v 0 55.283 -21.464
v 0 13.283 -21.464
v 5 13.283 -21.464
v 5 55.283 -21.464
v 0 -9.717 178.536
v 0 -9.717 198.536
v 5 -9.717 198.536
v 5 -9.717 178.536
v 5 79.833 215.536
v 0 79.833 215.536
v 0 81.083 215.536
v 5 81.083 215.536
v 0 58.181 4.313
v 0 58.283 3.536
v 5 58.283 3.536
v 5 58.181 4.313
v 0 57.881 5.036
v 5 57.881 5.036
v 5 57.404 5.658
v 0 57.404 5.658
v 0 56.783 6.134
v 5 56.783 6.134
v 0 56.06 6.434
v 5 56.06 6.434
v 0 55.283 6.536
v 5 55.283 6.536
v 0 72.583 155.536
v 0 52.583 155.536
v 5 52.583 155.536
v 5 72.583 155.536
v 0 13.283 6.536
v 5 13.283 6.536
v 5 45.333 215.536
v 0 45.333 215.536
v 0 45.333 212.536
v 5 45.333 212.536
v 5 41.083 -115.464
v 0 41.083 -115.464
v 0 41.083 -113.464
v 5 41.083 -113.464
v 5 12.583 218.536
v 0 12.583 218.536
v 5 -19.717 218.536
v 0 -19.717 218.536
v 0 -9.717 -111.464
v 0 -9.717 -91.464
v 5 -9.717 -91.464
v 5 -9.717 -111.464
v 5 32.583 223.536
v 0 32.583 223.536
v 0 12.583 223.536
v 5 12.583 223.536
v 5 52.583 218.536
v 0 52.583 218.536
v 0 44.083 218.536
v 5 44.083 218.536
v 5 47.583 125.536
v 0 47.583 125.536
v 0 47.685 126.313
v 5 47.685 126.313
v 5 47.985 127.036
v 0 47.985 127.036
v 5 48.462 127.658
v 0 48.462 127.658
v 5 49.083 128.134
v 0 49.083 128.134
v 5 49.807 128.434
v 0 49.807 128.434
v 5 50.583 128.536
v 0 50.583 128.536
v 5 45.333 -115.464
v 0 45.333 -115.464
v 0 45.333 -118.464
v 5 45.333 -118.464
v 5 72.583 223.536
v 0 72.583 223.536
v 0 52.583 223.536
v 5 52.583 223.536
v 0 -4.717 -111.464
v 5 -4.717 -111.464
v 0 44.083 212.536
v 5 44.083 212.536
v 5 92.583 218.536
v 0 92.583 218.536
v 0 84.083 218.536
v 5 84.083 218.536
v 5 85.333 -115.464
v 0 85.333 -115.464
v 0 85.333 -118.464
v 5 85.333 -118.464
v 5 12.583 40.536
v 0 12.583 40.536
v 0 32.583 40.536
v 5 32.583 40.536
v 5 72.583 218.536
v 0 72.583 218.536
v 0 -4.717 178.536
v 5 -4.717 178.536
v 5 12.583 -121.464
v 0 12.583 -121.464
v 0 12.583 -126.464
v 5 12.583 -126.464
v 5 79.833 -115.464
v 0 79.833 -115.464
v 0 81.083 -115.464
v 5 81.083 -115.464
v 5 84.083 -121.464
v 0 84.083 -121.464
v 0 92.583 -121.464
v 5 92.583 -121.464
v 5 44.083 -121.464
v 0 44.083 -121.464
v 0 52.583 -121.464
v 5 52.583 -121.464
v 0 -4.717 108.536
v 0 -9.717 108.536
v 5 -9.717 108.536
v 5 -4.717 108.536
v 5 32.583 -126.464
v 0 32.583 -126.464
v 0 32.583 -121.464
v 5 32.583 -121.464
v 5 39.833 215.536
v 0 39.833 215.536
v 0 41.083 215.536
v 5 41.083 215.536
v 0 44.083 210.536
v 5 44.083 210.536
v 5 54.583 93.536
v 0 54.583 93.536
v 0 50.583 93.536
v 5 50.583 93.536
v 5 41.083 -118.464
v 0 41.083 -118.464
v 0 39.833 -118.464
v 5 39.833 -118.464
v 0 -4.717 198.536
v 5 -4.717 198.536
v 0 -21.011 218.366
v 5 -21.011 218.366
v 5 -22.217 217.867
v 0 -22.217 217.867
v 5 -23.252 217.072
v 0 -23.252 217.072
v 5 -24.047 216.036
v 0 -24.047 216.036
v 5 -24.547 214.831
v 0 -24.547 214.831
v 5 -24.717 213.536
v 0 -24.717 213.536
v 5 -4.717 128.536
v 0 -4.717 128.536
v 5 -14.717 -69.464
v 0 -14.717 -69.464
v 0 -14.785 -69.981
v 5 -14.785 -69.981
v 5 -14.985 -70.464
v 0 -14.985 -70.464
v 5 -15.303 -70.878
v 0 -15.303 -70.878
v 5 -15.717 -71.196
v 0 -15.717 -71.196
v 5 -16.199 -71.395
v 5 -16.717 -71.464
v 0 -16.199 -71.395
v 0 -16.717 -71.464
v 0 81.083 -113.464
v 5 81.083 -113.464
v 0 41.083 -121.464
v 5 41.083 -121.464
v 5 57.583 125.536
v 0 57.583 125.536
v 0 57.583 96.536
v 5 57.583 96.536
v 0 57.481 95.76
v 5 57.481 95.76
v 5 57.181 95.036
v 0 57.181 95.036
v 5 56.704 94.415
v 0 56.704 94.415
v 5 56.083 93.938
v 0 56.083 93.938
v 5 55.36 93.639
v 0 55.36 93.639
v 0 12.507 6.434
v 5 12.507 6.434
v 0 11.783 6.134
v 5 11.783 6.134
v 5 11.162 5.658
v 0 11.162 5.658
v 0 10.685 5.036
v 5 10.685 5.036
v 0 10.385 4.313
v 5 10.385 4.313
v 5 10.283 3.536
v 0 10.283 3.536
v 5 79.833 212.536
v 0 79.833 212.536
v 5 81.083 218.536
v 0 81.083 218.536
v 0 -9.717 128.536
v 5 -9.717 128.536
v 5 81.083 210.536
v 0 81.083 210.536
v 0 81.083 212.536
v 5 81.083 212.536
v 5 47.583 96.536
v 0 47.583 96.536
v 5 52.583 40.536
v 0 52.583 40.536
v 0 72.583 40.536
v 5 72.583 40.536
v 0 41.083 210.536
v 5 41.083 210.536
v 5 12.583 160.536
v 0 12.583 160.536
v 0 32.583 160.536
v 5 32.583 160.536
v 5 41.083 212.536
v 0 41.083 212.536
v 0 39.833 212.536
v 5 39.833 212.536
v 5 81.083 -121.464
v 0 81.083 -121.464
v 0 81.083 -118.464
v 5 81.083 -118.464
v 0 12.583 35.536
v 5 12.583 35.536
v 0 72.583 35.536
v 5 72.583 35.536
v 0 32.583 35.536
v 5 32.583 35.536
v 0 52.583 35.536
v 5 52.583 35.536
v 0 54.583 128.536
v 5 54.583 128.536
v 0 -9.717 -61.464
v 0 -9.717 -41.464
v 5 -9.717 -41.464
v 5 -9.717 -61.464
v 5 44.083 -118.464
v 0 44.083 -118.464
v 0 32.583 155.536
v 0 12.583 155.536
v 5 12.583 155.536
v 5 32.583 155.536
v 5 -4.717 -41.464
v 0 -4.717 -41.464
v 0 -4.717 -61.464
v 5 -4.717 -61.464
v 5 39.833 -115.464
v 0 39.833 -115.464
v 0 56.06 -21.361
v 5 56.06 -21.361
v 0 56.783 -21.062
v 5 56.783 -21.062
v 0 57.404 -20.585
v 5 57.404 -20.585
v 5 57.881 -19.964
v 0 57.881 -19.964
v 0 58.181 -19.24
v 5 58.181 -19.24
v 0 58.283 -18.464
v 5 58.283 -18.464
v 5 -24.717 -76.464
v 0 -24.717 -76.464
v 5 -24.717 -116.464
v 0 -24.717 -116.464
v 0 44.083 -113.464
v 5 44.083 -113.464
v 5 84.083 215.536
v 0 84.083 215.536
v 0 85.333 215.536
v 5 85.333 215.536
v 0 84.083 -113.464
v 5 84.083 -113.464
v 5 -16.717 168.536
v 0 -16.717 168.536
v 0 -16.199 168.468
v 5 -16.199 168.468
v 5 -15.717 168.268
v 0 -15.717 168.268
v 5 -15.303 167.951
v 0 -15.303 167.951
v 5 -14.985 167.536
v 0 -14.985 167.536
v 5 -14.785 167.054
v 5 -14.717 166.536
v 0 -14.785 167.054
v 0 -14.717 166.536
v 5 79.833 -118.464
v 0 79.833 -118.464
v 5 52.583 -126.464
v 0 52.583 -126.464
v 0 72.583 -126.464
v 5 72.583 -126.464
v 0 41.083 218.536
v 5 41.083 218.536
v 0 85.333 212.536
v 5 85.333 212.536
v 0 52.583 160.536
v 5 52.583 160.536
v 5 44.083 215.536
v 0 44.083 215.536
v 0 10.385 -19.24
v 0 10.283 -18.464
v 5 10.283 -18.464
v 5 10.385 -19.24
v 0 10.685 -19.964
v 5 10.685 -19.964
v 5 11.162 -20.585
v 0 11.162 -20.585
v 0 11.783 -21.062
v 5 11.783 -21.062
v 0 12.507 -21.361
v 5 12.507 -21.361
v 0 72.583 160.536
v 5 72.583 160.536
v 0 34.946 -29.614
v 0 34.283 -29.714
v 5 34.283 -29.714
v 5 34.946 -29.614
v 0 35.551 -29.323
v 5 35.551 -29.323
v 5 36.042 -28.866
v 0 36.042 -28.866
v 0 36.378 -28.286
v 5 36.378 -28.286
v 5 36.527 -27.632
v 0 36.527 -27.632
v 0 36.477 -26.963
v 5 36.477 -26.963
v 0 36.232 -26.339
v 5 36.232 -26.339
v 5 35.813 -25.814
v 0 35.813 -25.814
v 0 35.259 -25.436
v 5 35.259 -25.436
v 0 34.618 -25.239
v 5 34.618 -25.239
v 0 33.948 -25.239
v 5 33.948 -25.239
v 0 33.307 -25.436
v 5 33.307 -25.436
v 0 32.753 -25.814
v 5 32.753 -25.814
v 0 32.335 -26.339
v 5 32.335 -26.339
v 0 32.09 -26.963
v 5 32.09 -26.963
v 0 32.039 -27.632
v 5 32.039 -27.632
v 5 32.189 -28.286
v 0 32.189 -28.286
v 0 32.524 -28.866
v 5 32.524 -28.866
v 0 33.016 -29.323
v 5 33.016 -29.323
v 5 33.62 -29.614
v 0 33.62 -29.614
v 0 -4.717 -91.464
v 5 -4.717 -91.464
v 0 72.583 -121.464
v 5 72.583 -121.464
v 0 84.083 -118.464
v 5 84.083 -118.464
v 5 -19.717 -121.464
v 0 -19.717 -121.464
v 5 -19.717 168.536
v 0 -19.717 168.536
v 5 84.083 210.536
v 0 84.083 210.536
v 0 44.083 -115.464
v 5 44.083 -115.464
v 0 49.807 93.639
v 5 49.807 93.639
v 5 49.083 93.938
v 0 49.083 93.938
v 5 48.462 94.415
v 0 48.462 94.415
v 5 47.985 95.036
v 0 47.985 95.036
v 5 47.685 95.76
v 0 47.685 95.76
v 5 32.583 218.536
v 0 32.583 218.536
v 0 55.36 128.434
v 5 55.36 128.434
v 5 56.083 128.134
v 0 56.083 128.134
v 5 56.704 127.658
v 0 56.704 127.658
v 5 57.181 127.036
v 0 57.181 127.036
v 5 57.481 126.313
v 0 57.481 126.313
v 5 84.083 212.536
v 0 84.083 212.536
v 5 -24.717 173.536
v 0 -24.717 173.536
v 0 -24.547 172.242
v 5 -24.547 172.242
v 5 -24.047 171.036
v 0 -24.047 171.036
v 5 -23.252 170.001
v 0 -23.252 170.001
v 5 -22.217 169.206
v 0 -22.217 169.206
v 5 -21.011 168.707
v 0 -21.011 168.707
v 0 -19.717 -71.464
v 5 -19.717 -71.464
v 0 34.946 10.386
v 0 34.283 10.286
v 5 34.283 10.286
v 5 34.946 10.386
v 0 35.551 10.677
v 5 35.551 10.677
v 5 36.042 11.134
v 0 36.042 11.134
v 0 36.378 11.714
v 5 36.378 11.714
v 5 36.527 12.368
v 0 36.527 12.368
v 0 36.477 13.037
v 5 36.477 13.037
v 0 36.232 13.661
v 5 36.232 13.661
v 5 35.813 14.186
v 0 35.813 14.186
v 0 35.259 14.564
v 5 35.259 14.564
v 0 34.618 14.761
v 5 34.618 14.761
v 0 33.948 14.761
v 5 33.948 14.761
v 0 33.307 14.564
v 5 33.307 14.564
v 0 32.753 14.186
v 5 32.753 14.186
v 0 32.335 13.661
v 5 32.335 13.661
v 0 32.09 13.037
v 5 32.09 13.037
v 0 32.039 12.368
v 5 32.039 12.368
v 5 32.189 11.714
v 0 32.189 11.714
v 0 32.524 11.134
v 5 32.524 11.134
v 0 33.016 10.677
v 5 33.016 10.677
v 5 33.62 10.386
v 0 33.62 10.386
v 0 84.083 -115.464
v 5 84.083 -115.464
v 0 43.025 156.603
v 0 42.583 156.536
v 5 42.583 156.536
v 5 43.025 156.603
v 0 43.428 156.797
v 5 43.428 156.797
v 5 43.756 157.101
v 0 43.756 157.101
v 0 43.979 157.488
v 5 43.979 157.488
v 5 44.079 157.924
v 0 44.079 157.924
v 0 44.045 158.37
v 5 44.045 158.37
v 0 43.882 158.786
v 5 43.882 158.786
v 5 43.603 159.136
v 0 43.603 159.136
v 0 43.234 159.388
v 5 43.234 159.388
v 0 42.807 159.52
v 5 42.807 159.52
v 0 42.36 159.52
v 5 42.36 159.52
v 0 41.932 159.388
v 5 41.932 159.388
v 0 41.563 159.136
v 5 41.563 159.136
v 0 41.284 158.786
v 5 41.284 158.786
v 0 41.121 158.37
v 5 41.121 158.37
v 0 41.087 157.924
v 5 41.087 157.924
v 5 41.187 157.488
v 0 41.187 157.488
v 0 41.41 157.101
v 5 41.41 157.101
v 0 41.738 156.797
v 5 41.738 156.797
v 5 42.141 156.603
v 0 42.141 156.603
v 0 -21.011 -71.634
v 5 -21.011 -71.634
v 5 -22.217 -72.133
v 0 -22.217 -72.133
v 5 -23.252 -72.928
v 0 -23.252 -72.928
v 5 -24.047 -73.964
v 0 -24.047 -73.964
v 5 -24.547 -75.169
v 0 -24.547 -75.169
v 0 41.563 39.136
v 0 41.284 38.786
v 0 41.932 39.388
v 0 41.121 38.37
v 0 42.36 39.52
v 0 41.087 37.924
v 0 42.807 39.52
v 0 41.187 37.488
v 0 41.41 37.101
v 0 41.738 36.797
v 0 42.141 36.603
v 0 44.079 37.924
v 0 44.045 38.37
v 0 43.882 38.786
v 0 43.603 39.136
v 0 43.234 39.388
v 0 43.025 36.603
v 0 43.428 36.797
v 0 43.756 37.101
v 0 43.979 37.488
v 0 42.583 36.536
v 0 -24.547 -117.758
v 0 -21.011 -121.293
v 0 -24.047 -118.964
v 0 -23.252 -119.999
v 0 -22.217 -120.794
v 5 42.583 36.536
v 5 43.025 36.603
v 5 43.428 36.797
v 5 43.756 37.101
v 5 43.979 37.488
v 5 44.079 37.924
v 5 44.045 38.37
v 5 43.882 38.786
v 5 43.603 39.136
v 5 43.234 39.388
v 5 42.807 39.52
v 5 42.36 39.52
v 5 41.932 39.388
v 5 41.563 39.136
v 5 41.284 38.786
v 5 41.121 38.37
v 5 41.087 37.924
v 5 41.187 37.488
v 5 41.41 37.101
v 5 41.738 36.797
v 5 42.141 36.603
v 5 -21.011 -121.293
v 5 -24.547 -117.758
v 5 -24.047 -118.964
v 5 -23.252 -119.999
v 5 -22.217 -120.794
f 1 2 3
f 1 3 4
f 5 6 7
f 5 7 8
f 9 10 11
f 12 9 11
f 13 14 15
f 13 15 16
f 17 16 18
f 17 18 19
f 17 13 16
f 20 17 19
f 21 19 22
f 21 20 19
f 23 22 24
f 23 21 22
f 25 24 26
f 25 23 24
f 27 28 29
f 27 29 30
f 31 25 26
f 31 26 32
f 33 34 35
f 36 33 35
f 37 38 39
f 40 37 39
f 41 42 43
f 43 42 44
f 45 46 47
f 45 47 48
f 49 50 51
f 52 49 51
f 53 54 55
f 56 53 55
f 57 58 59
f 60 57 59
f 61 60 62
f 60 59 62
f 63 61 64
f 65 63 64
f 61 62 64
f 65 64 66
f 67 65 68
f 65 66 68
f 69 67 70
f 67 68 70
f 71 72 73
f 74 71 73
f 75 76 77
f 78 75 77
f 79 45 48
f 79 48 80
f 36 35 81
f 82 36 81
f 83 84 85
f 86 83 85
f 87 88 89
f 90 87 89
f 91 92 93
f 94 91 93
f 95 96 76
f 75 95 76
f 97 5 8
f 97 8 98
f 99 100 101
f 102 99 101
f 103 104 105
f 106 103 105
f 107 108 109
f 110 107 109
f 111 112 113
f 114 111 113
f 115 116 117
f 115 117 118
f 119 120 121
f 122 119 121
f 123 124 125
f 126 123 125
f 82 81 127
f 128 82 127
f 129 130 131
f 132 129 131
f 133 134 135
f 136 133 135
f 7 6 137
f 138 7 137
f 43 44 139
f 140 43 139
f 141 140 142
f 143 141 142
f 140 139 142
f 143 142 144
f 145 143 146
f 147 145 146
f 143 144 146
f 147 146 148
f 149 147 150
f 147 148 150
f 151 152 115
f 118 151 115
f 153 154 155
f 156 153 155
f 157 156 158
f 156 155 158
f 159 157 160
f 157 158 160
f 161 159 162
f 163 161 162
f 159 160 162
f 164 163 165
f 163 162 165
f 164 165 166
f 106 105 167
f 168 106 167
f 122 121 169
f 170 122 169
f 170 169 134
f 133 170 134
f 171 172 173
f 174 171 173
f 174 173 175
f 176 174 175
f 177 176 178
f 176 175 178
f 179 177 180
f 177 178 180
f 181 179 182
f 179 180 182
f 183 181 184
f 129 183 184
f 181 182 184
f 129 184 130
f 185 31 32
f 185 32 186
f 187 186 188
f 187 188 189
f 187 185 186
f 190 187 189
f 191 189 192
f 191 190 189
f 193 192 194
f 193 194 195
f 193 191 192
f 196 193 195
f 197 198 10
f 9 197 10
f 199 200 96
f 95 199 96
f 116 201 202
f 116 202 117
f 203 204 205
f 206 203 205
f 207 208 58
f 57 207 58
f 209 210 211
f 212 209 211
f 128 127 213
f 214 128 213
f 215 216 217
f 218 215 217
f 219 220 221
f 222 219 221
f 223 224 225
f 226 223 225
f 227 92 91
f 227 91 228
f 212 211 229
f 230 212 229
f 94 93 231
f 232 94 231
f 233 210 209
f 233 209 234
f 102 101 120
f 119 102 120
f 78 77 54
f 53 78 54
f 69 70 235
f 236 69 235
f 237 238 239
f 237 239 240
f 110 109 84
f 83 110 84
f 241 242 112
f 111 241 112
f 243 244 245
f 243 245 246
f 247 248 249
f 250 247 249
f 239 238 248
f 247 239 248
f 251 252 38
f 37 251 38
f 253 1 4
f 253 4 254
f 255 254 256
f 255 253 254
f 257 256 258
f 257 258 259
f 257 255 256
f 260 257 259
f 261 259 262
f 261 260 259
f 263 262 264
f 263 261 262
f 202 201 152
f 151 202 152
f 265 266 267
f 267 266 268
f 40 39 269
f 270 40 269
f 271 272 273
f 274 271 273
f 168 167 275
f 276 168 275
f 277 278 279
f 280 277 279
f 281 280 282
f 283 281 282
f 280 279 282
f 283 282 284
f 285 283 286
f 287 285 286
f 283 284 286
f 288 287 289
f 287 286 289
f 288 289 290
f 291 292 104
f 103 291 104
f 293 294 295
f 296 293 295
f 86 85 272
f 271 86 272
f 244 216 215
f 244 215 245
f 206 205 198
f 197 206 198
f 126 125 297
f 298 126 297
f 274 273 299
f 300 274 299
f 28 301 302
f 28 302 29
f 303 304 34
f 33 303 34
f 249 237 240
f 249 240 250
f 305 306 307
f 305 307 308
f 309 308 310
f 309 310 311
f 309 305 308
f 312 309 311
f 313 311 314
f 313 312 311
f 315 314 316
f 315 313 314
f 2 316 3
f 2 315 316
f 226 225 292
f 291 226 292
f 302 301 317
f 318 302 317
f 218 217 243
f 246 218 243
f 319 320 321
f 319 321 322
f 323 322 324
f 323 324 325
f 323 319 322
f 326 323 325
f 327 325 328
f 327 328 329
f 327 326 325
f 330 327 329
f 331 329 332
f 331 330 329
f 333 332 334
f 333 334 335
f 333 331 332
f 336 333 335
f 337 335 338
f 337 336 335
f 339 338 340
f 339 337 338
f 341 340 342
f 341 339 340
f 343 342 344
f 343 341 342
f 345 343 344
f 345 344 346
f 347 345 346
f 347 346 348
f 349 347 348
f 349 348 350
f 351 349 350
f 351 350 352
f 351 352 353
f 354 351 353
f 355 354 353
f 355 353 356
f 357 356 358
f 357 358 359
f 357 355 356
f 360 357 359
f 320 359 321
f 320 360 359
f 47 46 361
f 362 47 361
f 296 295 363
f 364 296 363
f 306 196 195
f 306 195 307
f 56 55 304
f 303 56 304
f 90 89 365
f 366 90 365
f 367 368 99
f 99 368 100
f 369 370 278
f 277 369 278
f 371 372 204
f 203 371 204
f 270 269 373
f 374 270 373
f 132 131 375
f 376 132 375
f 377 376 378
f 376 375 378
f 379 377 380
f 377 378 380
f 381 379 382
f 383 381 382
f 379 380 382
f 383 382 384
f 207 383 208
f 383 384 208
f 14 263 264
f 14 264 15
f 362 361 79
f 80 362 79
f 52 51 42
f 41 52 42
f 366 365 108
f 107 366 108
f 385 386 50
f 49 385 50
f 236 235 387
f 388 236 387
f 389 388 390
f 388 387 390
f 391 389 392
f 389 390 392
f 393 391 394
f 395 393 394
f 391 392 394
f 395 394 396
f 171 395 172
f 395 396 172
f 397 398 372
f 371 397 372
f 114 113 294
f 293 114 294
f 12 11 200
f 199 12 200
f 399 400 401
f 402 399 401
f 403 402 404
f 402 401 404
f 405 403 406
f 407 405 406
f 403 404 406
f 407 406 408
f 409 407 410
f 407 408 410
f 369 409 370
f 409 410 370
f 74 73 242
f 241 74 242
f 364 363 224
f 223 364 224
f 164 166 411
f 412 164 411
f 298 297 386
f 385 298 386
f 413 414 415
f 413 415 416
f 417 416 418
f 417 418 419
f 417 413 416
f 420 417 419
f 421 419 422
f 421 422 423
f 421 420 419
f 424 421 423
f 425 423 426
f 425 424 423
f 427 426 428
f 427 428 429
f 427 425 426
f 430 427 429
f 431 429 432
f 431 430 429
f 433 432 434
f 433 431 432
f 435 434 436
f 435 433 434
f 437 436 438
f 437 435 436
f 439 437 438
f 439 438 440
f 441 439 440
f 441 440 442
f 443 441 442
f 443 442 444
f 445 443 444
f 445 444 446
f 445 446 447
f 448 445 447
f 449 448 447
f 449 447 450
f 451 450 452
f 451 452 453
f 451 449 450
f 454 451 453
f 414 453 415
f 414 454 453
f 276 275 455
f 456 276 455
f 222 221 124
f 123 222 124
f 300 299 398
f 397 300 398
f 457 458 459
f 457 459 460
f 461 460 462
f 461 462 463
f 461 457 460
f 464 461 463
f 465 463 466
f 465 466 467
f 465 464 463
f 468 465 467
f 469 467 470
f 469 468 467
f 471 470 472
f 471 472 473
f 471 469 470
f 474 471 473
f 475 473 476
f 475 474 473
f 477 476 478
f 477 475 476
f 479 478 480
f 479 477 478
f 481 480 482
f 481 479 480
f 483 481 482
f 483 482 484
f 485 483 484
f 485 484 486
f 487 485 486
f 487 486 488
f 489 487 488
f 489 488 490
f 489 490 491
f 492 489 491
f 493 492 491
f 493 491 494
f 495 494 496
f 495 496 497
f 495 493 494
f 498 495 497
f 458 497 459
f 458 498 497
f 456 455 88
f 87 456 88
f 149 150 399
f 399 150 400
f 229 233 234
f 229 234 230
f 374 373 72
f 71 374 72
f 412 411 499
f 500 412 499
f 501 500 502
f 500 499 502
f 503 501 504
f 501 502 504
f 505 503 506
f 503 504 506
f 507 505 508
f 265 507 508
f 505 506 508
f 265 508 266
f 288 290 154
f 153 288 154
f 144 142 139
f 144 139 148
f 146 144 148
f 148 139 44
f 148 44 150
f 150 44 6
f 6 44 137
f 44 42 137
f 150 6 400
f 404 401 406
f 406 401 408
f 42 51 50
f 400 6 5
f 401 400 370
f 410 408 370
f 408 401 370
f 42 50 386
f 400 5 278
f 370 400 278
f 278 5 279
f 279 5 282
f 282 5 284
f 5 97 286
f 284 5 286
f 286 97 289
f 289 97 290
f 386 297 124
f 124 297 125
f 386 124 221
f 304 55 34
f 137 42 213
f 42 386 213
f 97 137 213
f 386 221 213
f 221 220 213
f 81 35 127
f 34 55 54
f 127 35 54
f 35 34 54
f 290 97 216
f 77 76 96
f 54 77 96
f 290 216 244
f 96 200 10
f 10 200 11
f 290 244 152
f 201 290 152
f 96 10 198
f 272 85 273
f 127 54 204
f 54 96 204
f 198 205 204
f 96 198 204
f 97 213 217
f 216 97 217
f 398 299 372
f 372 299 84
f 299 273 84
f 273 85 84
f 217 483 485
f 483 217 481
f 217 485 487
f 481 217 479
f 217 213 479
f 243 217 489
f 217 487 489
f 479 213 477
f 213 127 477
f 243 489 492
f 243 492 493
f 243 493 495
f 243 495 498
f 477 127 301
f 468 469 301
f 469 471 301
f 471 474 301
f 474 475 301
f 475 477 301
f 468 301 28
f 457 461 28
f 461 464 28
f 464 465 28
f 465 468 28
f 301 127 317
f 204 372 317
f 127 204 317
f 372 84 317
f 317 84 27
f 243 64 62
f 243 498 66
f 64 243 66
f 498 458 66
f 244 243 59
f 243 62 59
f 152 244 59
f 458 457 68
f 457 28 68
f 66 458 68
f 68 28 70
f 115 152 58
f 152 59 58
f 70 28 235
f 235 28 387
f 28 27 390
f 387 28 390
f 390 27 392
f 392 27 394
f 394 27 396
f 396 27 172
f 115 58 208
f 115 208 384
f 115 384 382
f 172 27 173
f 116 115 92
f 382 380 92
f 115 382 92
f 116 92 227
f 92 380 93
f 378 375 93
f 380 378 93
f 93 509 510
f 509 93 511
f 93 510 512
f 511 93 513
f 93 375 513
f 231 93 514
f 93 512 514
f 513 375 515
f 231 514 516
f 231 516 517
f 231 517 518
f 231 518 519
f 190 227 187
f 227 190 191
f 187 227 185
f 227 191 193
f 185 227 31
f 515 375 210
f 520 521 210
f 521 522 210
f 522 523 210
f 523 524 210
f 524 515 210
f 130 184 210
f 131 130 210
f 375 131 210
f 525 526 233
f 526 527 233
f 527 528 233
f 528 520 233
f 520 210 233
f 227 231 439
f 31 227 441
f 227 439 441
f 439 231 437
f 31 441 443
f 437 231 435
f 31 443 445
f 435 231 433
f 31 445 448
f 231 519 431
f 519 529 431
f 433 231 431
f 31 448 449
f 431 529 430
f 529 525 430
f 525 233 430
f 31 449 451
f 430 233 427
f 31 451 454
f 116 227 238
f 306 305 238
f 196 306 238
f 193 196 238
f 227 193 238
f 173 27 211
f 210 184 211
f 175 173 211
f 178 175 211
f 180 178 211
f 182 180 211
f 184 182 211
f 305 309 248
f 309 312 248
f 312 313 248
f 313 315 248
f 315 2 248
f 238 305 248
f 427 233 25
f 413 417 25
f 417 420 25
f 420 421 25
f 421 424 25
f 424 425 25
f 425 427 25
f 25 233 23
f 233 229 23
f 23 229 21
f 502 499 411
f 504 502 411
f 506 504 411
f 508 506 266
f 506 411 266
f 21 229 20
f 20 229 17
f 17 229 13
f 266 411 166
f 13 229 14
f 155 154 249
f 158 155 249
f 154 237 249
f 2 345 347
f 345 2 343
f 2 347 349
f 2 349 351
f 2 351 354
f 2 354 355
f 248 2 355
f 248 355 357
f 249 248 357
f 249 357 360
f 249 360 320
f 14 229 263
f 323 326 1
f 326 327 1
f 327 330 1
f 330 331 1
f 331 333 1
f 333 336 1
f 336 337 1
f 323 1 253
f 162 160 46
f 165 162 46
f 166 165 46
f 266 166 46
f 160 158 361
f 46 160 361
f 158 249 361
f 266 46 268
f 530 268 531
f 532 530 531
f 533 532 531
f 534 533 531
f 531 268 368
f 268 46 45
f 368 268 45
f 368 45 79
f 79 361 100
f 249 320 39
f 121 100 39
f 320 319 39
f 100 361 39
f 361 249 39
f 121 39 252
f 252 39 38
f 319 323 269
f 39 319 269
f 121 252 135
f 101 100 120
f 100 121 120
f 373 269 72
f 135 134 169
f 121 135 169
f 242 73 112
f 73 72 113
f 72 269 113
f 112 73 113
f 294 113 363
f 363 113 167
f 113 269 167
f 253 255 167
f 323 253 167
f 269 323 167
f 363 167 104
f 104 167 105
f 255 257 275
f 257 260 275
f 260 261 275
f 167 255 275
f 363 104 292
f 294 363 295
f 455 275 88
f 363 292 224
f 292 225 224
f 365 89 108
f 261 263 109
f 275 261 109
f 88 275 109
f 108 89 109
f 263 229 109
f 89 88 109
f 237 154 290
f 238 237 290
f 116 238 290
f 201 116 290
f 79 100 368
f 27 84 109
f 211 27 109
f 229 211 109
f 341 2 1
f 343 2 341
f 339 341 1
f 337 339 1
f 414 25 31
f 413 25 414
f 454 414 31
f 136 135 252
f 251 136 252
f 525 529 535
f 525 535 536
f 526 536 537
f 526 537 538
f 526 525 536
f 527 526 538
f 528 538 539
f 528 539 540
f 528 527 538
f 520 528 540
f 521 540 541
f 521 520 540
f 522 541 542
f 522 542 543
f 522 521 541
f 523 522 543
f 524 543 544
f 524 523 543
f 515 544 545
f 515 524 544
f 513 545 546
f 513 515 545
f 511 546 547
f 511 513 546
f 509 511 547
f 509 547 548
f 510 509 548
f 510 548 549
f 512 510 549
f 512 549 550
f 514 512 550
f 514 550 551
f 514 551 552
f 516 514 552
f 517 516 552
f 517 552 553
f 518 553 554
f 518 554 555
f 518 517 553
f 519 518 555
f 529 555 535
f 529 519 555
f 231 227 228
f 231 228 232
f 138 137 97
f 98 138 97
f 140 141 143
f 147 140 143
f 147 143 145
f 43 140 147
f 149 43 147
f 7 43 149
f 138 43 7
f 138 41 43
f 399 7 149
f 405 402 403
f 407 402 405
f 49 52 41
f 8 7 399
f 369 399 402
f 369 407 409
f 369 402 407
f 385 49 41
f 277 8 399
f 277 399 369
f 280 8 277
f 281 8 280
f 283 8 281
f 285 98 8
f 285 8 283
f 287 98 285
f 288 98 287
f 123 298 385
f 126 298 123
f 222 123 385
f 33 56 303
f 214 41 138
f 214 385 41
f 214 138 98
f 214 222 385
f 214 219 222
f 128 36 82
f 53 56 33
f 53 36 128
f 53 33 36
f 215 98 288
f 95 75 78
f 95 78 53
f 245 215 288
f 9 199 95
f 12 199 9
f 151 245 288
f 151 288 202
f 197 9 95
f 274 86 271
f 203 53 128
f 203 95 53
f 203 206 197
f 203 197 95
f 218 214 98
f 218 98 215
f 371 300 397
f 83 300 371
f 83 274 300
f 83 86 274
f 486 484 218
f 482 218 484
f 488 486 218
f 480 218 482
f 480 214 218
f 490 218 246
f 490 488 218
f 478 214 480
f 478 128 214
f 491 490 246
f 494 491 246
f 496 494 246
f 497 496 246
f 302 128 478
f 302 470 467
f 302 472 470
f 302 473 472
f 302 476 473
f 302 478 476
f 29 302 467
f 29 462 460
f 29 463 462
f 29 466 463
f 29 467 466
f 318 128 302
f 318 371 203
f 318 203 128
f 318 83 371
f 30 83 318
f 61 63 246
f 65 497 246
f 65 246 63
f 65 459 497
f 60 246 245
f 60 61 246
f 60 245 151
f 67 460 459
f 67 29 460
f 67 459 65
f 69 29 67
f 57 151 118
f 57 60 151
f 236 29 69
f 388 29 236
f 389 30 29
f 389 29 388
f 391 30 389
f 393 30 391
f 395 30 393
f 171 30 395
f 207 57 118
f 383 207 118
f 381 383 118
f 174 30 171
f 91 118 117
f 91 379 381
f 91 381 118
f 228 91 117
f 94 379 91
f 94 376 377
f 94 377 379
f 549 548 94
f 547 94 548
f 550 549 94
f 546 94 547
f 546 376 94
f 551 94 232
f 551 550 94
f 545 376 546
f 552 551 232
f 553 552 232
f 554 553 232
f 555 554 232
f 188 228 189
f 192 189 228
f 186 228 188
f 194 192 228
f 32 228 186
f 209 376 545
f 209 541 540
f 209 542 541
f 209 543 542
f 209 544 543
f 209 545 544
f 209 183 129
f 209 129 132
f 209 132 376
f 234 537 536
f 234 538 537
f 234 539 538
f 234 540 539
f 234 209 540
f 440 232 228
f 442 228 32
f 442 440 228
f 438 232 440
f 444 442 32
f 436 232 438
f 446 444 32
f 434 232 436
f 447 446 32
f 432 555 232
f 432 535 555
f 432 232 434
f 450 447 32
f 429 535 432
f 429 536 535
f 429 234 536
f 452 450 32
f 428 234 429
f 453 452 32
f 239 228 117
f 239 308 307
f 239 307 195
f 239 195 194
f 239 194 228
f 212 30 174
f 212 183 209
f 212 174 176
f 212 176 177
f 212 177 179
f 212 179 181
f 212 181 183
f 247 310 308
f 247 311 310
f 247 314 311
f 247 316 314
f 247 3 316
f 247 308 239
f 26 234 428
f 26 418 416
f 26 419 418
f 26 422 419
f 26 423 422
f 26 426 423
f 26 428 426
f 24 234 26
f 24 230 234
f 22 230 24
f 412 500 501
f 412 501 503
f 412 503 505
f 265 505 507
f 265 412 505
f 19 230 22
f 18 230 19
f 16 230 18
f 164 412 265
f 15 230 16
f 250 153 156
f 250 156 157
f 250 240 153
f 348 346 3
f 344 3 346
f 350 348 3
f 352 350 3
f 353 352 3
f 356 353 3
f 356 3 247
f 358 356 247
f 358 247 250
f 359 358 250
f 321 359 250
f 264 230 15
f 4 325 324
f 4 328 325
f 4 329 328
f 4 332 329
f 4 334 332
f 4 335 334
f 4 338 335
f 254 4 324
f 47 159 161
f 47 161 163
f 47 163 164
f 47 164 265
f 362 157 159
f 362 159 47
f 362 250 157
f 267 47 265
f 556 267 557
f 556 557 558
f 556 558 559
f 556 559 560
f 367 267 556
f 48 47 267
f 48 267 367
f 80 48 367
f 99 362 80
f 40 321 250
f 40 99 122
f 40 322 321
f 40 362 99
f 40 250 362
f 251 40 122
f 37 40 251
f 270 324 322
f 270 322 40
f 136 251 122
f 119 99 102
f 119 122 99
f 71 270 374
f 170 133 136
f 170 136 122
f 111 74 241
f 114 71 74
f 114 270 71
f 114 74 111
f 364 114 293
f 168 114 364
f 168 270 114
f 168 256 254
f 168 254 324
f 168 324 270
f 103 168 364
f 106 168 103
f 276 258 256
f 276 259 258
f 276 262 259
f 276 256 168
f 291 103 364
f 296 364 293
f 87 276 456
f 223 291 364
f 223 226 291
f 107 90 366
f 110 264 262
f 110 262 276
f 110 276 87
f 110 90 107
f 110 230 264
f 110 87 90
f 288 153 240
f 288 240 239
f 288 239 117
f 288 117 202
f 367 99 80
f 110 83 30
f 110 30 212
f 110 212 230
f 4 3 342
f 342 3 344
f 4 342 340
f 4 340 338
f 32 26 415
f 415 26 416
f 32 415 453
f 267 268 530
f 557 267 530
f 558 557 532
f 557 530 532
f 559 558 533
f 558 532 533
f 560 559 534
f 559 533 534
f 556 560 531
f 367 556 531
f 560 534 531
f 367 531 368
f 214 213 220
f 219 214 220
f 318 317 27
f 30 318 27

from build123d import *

# Parameters (mm, degrees)
SKETCH_1_R      = 2.25
SKETCH_1_R_2    = 1.5
SKETCH_1_W      = 5
SKETCH_1_H      = 20
SKETCH_1_W_2    = 20
SKETCH_1_H_2    = 5
EXTRUDE_1_DEPTH = 5


with BuildPart() as part:
    # 草图1 → 凸台-拉伸1 (new body)
    with BuildSketch(Plane(origin=(0, 0, 0), x_dir=(0, 0, -1), z_dir=(1, 0, 0))):
        with BuildLine():
            Line((-168.536416178, -19.716908756), (-168.536416178, -16.716908756))
            ThreePointArc((-168.536416178, -16.716908756), (-167.950629741, -15.302695194), (-166.536416178, -14.716908756))
            Line((-166.536416178, -14.716908756), (69.463583822, -14.716908756))
            ThreePointArc((69.463583822, -14.716908756), (70.877797384, -15.302695194), (71.463583822, -16.716908756))
            Line((71.463583822, -16.716908756), (71.463583822, -19.716908756))
            ThreePointArc((71.463583822, -19.716908756), (72.928049916, -23.252442662), (76.463583822, -24.716908756))
            Line((76.463583822, -24.716908756), (116.463583822, -24.716908756))
            ThreePointArc((116.463583822, -24.716908756), (119.999117728, -23.252442662), (121.463583822, -19.716908756))
            Line((121.463583822, -19.716908756), (121.463583822, 12.583091244))
            Line((121.463583822, 12.583091244), (126.463583822, 12.583091244))
            Line((126.463583822, 12.583091244), (126.463583822, 32.583091244))
            Line((126.463583822, 32.583091244), (121.463583822, 32.583091244))
            Line((121.463583822, 32.583091244), (121.463583822, 41.083091244))
            Line((121.463583822, 41.083091244), (118.463583822, 41.083091244))
            Line((118.463583822, 41.083091244), (118.463583822, 39.833091244))
            Line((118.463583822, 39.833091244), (115.463583822, 39.833091244))
            Line((115.463583822, 39.833091244), (115.463583822, 41.083091244))
            Line((115.463583822, 41.083091244), (113.463583822, 41.083091244))
            Line((113.463583822, 41.083091244), (113.463583822, 44.083091244))
            Line((113.463583822, 44.083091244), (115.463583822, 44.083091244))
            Line((115.463583822, 44.083091244), (115.463583822, 45.333091244))
            Line((115.463583822, 45.333091244), (118.463583822, 45.333091244))
            Line((118.463583822, 45.333091244), (118.463583822, 44.083091244))
            Line((118.463583822, 44.083091244), (121.463583822, 44.083091244))
            Line((121.463583822, 44.083091244), (121.463583822, 52.583091244))
            Line((121.463583822, 52.583091244), (126.463583822, 52.583091244))
            Line((126.463583822, 52.583091244), (126.463583822, 72.583091244))
            Line((126.463583822, 72.583091244), (121.463583822, 72.583091244))
            Line((121.463583822, 72.583091244), (121.463583822, 81.083091244))
            Line((121.463583822, 81.083091244), (118.463583822, 81.083091244))
            Line((118.463583822, 81.083091244), (118.463583822, 79.833091244))
            Line((118.463583822, 79.833091244), (115.463583822, 79.833091244))
            Line((115.463583822, 79.833091244), (115.463583822, 81.083091244))
            Line((115.463583822, 81.083091244), (113.463583822, 81.083091244))
            Line((113.463583822, 81.083091244), (113.463583822, 84.083091244))
            Line((113.463583822, 84.083091244), (115.463583822, 84.083091244))
            Line((115.463583822, 84.083091244), (115.463583822, 85.333091244))
            Line((115.463583822, 85.333091244), (118.463583822, 85.333091244))
            Line((118.463583822, 85.333091244), (118.463583822, 84.083091244))
            Line((118.463583822, 84.083091244), (121.463583822, 84.083091244))
            Line((121.463583822, 84.083091244), (121.463583822, 92.583091244))
            Line((121.463583822, 92.583091244), (-218.536416178, 92.583091244))
            Line((-218.536416178, 92.583091244), (-218.536416178, 84.083091244))
            Line((-218.536416178, 84.083091244), (-215.536416178, 84.083091244))
            Line((-215.536416178, 84.083091244), (-215.536416178, 85.333091244))
            Line((-215.536416178, 85.333091244), (-212.536416178, 85.333091244))
            Line((-212.536416178, 85.333091244), (-212.536416178, 84.083091244))
            Line((-212.536416178, 84.083091244), (-210.536416178, 84.083091244))
            Line((-210.536416178, 84.083091244), (-210.536416178, 81.083091244))
            Line((-210.536416178, 81.083091244), (-212.536416178, 81.083091244))
            Line((-212.536416178, 81.083091244), (-212.536416178, 79.833091244))
            Line((-212.536416178, 79.833091244), (-215.536416178, 79.833091244))
            Line((-215.536416178, 79.833091244), (-215.536416178, 81.083091244))
            Line((-215.536416178, 81.083091244), (-218.536416178, 81.083091244))
            Line((-218.536416178, 81.083091244), (-218.536416178, 72.583091244))
            Line((-218.536416178, 72.583091244), (-223.536416178, 72.583091244))
            Line((-223.536416178, 72.583091244), (-223.536416178, 52.583091244))
            Line((-223.536416178, 52.583091244), (-218.536416178, 52.583091244))
            Line((-218.536416178, 52.583091244), (-218.536416178, 44.083091244))
            Line((-218.536416178, 44.083091244), (-215.536416178, 44.083091244))
            Line((-215.536416178, 44.083091244), (-215.536416178, 45.333091244))
            Line((-215.536416178, 45.333091244), (-212.536416178, 45.333091244))
            Line((-212.536416178, 45.333091244), (-212.536416178, 44.083091244))
            Line((-212.536416178, 44.083091244), (-210.536416178, 44.083091244))
            Line((-210.536416178, 44.083091244), (-210.536416178, 41.083091244))
            Line((-210.536416178, 41.083091244), (-212.536416178, 41.083091244))
            Line((-212.536416178, 41.083091244), (-212.536416178, 39.833091244))
            Line((-212.536416178, 39.833091244), (-215.536416178, 39.833091244))
            Line((-215.536416178, 39.833091244), (-215.536416178, 41.083091244))
            Line((-215.536416178, 41.083091244), (-218.536416178, 41.083091244))
            Line((-218.536416178, 41.083091244), (-218.536416178, 32.583091244))
            Line((-218.536416178, 32.583091244), (-223.536416178, 32.583091244))
            Line((-223.536416178, 32.583091244), (-223.536416178, 12.583091244))
            Line((-223.536416178, 12.583091244), (-218.536416178, 12.583091244))
            Line((-218.536416178, 12.583091244), (-218.536416178, -19.716908756))
            ThreePointArc((-218.536416178, -19.716908756), (-217.071950084, -23.252442662), (-213.536416178, -24.716908756))
            Line((-213.536416178, -24.716908756), (-173.536416178, -24.716908756))
            ThreePointArc((-173.536416178, -24.716908756), (-170.000882272, -23.252442662), (-168.536416178, -19.716908756))
        make_face()
        with Locations((27.463583822, 34.283091244)):
            Circle(SKETCH_1_R, mode=Mode.SUBTRACT)
        with Locations((-12.536416178, 34.283091244)):
            Circle(SKETCH_1_R, mode=Mode.SUBTRACT)
        with Locations((-38.036416178, 42.583091244)):
            Circle(SKETCH_1_R_2, mode=Mode.SUBTRACT)
        with Locations((-158.036416178, 42.583091244)):
            Circle(SKETCH_1_R_2, mode=Mode.SUBTRACT)
        with Locations((-38.036416178, 62.583091244)):
            Rectangle(SKETCH_1_W, SKETCH_1_H, mode=Mode.SUBTRACT)
        with Locations((-38.036416178, 22.583091244)):
            Rectangle(SKETCH_1_W, SKETCH_1_H, mode=Mode.SUBTRACT)
        with Locations((-158.036416178, 62.583091244)):
            Rectangle(SKETCH_1_W, SKETCH_1_H, mode=Mode.SUBTRACT)
        with Locations((-158.036416178, 22.583091244)):
            Rectangle(SKETCH_1_W, SKETCH_1_H, mode=Mode.SUBTRACT)
        with Locations((-118.536416178, -7.216908756)):
            Rectangle(SKETCH_1_W_2, SKETCH_1_H_2, mode=Mode.SUBTRACT)
        with Locations((-188.536416178, -7.216908756)):
            Rectangle(SKETCH_1_W_2, SKETCH_1_H_2, mode=Mode.SUBTRACT)
        with Locations((101.463583822, -7.216908756)):
            Rectangle(SKETCH_1_W_2, SKETCH_1_H_2, mode=Mode.SUBTRACT)
        with Locations((51.463583822, -7.216908756)):
            Rectangle(SKETCH_1_W_2, SKETCH_1_H_2, mode=Mode.SUBTRACT)
        with BuildLine():
            Line((18.463583822, 58.283091244), (-3.536416178, 58.283091244))
            ThreePointArc((-3.536416178, 58.283091244), (-5.657736522, 57.404411587), (-6.536416178, 55.283091244))
            Line((-6.536416178, 55.283091244), (-6.536416178, 13.283091244))
            ThreePointArc((-6.536416178, 13.283091244), (-5.657736522, 11.1617709), (-3.536416178, 10.283091244))
            Line((-3.536416178, 10.283091244), (18.463583822, 10.283091244))
            ThreePointArc((18.463583822, 10.283091244), (20.584904165, 11.1617709), (21.463583822, 13.283091244))
            Line((21.463583822, 13.283091244), (21.463583822, 55.283091244))
            ThreePointArc((21.463583822, 55.283091244), (20.584904165, 57.404411587), (18.463583822, 58.283091244))
        make_face(mode=Mode.SUBTRACT)
        with BuildLine():
            Line((-125.536416178, 57.583091244), (-96.536416178, 57.583091244))
            ThreePointArc((-96.536416178, 57.583091244), (-94.415095835, 56.704411587), (-93.536416178, 54.583091244))
            Line((-93.536416178, 54.583091244), (-93.536416178, 50.583091244))
            ThreePointArc((-93.536416178, 50.583091244), (-94.415095835, 48.4617709), (-96.536416178, 47.583091244))
            Line((-96.536416178, 47.583091244), (-125.536416178, 47.583091244))
            ThreePointArc((-125.536416178, 47.583091244), (-127.657736522, 48.4617709), (-128.536416178, 50.583091244))
            Line((-128.536416178, 50.583091244), (-128.536416178, 54.583091244))
            ThreePointArc((-128.536416178, 54.583091244), (-127.657736522, 56.704411587), (-125.536416178, 57.583091244))
        make_face(mode=Mode.SUBTRACT)
    extrude(amount=EXTRUDE_1_DEPTH)


solid = part.part
